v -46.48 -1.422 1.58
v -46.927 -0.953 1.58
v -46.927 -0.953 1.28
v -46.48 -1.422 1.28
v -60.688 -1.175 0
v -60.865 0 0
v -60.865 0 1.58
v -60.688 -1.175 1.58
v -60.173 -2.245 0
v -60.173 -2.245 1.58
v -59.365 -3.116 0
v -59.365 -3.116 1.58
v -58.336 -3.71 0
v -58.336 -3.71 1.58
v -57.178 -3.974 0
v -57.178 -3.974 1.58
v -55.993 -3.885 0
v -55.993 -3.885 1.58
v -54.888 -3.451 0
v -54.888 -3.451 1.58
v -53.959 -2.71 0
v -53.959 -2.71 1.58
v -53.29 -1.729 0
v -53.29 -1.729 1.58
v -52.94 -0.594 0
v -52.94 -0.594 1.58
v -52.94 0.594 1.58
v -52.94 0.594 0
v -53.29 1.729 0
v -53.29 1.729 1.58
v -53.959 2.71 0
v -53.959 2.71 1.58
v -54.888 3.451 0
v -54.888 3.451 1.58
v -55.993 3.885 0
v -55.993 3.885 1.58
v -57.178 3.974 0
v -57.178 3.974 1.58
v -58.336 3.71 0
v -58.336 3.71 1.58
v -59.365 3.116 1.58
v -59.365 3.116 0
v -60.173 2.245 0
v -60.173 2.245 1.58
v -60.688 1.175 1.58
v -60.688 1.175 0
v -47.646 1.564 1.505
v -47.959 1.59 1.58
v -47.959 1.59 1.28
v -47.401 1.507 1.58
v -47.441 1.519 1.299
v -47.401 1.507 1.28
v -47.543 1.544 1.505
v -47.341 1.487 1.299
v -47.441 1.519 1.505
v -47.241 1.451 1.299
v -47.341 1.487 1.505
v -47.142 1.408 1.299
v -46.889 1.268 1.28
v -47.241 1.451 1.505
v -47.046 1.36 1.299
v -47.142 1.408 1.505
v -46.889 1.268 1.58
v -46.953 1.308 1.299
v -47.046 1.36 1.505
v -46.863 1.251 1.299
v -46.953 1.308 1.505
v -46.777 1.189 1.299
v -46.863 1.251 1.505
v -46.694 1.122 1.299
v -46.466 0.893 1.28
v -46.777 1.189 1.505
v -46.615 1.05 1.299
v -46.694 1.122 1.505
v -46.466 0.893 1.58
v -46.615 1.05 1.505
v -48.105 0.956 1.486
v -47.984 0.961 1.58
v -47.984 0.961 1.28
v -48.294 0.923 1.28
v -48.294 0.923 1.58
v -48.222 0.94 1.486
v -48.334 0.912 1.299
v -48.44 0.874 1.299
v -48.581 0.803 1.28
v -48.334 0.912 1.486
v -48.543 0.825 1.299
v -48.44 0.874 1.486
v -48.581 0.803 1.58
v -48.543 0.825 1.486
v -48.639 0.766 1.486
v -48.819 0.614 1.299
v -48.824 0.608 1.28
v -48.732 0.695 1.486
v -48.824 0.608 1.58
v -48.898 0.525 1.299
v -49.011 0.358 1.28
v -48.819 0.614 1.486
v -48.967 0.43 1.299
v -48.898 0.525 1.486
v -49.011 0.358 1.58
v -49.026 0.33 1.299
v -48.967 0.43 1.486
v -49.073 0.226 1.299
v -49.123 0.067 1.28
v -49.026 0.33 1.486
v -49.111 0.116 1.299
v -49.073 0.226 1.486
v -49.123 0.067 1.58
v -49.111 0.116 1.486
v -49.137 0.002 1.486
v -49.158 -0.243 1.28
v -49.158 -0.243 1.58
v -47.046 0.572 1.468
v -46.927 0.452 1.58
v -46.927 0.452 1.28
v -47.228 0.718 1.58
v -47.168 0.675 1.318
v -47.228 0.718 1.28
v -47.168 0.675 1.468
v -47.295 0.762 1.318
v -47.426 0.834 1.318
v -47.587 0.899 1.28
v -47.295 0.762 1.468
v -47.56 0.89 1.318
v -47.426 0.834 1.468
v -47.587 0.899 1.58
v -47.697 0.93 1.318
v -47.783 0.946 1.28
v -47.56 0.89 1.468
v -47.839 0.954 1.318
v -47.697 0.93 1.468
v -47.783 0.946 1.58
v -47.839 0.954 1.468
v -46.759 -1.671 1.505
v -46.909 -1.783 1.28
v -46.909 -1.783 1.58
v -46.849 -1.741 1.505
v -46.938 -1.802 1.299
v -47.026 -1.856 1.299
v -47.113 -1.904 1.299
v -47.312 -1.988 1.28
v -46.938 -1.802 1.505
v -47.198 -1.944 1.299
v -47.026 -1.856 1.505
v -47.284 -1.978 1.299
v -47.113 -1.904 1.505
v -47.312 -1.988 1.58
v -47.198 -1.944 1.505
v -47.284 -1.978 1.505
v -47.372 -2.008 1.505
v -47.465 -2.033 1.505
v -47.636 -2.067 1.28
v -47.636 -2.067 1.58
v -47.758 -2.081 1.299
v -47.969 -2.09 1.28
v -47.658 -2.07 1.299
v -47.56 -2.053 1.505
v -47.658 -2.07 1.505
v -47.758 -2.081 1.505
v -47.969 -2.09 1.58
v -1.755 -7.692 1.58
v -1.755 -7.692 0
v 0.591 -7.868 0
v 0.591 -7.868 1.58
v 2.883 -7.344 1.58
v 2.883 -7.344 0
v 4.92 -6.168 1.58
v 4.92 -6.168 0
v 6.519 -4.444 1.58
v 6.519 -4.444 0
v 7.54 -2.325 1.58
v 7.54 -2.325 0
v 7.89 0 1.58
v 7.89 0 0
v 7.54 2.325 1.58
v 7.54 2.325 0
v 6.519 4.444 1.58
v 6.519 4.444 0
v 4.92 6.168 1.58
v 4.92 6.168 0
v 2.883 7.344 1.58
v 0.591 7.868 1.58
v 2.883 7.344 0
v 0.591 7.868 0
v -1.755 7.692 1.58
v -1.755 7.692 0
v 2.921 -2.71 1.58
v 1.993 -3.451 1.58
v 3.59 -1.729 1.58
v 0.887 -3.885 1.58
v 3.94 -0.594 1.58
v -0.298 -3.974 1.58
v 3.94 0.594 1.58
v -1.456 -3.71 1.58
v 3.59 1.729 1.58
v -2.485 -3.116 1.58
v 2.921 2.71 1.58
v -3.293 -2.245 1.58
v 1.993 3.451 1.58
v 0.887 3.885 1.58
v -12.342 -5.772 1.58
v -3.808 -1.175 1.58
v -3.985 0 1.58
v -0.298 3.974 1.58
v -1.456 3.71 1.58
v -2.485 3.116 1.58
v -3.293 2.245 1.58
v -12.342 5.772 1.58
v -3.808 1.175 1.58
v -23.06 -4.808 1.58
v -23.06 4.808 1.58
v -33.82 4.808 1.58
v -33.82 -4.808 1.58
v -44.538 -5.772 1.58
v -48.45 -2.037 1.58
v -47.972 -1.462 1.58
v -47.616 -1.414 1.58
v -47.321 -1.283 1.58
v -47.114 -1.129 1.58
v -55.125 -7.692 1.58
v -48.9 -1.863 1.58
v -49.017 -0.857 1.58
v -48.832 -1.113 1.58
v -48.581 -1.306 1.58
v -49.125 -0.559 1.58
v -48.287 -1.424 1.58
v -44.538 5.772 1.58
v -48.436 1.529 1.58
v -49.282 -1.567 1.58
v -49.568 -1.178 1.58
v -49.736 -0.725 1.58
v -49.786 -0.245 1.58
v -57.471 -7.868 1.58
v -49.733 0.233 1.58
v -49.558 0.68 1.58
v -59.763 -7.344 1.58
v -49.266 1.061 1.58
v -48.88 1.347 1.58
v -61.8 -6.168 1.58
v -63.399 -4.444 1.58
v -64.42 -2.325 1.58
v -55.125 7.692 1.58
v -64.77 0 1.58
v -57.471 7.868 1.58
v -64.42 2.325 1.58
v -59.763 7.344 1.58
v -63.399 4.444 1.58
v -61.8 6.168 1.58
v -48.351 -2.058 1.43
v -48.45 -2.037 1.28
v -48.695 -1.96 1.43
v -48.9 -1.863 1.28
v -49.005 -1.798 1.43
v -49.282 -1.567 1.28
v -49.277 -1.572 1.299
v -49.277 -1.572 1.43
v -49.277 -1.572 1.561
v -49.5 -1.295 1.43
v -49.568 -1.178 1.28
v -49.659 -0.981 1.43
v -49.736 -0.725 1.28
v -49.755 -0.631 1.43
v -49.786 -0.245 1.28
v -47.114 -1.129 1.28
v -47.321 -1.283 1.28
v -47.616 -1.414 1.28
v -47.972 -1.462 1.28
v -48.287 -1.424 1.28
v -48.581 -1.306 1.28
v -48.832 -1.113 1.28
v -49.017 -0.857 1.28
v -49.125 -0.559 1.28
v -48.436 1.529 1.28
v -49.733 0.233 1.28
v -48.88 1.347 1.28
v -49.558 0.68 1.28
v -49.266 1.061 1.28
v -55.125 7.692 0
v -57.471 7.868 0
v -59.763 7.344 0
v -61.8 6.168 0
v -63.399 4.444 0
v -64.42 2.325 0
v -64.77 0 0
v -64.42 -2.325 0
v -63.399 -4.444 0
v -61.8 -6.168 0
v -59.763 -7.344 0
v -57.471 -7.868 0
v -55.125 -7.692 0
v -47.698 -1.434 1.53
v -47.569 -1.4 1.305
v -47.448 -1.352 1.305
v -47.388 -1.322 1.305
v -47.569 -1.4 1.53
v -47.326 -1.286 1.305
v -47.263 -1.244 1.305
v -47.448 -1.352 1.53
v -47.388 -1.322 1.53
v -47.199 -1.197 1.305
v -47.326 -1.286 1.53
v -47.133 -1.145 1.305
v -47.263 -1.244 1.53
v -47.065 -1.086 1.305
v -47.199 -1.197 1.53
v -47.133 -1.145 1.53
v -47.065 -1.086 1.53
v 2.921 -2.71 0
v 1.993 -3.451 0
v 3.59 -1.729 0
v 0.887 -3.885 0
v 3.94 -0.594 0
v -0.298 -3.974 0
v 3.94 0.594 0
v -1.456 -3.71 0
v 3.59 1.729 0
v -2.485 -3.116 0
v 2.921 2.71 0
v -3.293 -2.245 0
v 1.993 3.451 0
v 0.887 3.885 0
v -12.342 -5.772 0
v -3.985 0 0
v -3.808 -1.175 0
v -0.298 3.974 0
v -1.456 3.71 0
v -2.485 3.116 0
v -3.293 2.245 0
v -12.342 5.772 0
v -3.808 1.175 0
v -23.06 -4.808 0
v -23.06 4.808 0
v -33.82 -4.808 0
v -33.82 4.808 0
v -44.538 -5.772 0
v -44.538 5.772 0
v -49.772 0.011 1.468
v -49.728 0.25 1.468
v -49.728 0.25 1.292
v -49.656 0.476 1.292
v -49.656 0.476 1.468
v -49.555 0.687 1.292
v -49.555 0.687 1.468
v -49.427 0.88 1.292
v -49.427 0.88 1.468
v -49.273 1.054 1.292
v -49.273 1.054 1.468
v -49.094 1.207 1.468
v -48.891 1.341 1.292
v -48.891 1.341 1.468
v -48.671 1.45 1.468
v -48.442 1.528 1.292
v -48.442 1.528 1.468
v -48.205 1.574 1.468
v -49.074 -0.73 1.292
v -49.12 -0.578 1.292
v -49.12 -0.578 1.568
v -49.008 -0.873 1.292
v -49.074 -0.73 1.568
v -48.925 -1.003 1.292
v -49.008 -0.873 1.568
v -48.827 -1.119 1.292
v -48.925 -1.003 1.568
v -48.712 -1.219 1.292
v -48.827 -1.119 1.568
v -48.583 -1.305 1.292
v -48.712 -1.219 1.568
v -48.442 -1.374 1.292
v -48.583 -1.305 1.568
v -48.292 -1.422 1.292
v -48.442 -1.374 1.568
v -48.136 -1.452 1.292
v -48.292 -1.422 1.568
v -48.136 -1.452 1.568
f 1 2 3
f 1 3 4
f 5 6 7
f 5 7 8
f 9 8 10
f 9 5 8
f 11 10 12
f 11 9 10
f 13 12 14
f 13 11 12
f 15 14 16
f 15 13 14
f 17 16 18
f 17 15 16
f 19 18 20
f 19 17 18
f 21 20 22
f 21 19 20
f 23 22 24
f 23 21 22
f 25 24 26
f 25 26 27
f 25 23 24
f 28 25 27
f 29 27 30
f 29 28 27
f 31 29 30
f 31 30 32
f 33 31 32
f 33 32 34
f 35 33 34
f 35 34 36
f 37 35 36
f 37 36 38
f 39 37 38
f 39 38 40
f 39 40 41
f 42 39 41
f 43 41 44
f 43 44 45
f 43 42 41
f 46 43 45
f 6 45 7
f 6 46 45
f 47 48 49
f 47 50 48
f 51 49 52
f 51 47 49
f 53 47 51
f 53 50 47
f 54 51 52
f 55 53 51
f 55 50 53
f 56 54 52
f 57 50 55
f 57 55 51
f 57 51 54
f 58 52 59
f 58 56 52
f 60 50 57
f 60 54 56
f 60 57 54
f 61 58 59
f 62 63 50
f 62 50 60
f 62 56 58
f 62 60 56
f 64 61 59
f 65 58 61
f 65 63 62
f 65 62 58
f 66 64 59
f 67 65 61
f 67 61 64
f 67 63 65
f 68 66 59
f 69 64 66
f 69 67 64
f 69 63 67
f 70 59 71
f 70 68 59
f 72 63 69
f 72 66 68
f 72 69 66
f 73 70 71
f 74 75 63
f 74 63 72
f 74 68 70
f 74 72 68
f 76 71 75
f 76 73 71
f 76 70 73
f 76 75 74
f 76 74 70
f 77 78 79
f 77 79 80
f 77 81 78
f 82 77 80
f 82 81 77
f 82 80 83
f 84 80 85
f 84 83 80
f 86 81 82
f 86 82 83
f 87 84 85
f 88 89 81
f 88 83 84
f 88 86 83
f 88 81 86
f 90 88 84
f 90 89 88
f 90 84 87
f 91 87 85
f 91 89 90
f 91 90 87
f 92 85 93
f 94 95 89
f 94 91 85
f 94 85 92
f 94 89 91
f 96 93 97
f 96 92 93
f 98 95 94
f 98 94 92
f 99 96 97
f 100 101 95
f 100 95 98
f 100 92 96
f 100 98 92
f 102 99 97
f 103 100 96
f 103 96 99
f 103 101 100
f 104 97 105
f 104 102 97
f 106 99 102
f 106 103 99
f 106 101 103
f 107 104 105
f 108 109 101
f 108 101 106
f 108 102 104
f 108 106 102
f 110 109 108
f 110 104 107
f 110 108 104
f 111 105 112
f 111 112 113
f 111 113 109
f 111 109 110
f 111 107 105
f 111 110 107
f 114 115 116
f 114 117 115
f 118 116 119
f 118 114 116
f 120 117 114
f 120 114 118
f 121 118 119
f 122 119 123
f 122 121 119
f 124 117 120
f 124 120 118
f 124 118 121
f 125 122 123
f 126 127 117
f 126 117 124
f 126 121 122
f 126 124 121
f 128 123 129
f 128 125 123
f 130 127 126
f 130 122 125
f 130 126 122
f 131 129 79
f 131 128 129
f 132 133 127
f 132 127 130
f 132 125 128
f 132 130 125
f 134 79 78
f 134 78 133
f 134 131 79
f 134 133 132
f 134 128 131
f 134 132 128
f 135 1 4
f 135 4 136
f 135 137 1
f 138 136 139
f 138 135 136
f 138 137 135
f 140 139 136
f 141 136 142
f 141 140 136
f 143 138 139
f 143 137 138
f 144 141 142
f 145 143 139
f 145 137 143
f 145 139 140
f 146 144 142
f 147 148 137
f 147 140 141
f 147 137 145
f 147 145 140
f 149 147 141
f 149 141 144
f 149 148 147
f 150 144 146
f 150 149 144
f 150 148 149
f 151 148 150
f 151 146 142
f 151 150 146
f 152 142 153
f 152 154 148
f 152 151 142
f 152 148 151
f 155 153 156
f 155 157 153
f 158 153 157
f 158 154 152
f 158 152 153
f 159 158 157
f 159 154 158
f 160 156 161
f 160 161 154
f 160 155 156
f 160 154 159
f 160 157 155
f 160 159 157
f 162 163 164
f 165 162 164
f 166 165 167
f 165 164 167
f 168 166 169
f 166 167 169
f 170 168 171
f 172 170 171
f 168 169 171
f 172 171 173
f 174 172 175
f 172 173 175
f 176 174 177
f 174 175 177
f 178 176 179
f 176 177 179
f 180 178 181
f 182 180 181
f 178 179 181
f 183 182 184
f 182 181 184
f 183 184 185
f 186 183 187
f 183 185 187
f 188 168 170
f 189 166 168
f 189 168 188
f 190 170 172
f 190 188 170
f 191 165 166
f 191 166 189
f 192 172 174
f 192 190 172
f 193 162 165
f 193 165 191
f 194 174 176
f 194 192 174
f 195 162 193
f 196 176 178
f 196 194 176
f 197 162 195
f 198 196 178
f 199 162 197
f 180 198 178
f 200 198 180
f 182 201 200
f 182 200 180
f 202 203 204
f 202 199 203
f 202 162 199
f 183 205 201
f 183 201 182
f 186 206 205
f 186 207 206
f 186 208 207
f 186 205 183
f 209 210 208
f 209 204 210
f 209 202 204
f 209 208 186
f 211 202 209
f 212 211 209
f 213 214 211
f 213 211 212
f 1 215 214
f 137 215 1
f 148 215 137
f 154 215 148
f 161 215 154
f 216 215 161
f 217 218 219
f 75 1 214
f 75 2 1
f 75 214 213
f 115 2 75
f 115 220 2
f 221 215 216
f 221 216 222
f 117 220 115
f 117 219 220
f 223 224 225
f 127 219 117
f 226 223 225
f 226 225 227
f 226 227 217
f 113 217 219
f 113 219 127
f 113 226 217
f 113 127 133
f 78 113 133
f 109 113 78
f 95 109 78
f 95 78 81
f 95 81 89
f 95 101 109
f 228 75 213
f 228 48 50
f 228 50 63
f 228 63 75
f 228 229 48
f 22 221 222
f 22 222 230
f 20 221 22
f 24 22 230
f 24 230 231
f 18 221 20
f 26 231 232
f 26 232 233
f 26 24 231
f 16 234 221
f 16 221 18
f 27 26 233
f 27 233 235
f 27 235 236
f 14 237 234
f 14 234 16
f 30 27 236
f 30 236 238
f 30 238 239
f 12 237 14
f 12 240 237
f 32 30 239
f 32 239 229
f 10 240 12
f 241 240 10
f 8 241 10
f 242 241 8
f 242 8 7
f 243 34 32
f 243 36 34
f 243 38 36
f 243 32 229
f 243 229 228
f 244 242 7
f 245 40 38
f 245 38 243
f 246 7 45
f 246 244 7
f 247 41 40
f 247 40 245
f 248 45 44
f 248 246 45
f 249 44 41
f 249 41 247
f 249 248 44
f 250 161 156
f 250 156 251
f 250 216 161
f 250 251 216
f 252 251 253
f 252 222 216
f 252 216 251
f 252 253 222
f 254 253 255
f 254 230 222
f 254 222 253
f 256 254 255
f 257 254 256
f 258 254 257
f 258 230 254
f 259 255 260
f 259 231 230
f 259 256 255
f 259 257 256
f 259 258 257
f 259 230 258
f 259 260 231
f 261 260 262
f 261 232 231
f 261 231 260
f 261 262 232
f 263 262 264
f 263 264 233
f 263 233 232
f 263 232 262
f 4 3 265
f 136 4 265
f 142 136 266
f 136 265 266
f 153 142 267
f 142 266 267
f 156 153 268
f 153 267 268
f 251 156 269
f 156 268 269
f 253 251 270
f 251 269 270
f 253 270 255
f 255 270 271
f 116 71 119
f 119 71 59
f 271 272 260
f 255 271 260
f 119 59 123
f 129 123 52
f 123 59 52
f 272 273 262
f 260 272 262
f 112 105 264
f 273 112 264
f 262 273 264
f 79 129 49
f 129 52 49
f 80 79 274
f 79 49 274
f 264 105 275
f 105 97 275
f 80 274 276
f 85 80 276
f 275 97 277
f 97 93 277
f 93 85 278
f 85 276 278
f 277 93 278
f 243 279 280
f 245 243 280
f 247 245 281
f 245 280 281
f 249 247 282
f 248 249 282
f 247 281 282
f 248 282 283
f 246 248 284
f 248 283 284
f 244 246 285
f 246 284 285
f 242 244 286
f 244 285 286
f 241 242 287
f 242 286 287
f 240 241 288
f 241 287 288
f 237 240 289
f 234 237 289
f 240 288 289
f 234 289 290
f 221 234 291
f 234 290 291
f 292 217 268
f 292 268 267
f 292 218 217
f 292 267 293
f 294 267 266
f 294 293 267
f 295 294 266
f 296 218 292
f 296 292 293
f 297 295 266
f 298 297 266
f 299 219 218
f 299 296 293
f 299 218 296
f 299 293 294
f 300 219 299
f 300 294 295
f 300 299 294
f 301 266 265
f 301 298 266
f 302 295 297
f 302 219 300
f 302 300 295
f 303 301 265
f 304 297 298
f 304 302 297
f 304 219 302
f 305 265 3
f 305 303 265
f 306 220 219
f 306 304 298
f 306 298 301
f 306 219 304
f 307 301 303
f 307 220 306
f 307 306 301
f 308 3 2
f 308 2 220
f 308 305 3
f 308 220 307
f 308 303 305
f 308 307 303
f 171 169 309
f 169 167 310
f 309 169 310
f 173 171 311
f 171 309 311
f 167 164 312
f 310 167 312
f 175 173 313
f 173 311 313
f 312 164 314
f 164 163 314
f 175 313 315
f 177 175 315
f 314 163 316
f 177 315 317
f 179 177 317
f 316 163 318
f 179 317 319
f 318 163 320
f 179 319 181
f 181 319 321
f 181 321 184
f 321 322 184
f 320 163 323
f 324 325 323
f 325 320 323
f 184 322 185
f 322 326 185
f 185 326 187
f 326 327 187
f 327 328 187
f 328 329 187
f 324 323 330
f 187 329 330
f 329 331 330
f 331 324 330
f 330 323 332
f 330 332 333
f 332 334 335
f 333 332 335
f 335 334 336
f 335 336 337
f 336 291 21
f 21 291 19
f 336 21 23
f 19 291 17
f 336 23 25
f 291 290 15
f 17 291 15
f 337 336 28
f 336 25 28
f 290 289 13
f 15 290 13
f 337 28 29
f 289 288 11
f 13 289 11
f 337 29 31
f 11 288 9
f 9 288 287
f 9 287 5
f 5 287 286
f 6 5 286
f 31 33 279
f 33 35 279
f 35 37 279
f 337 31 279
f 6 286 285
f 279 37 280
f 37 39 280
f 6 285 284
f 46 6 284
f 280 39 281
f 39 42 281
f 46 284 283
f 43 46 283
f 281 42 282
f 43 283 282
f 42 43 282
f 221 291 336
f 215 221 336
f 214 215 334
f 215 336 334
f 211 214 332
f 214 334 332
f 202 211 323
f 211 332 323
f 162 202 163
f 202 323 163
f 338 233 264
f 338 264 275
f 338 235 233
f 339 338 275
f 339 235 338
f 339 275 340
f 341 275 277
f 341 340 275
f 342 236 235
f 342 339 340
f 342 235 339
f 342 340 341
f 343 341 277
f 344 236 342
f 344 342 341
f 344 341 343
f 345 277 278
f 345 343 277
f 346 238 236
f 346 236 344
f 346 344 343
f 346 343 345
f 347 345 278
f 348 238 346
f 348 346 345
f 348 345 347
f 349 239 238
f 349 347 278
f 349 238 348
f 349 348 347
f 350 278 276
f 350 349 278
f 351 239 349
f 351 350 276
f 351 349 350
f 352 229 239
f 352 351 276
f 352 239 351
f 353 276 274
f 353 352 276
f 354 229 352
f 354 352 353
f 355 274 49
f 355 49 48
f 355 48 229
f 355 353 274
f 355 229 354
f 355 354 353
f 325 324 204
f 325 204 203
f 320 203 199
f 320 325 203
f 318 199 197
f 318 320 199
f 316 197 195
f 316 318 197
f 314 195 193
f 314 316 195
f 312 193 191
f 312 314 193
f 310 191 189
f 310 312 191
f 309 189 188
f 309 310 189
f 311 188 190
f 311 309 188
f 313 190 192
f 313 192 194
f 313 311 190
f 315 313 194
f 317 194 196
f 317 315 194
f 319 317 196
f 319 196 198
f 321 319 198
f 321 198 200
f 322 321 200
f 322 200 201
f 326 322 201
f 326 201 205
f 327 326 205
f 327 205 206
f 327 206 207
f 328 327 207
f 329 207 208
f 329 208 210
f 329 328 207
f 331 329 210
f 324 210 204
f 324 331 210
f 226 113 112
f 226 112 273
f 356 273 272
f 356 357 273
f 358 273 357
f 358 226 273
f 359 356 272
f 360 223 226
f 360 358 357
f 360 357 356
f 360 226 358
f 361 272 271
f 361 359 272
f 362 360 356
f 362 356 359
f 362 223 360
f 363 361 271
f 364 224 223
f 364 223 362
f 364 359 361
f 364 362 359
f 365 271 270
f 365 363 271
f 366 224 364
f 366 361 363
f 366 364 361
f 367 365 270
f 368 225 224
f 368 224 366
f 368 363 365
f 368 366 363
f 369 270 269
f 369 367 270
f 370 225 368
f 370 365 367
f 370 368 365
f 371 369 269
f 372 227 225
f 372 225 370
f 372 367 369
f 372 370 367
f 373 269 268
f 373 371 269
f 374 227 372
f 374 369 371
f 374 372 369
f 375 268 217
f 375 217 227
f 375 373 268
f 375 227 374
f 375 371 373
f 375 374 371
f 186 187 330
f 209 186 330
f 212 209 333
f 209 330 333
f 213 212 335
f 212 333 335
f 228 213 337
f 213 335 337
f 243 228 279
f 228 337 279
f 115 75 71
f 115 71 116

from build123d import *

# Parameters (mm, degrees)
ESQUISSE1_R             = 3.985
BOSS_EXTRU_1_DEPTH      = 1.58
ENL_V_MAT_EXTRU_1_DEPTH = 0.3


with BuildPart() as part:
    # Esquisse1 → Boss.-Extru.1 (new body)
    with BuildSketch(Plane(origin=(0, 0, 0), x_dir=(0, 1, 0), z_dir=(0, 0, 1))):
        with BuildLine():
            ThreePointArc((-7.69243745, 1.754567206), (0, -7.89), (7.69243745, 1.754567206))
            ThreePointArc((7.69243745, 1.754567206), (4.687683834, 28.44), (7.69243745, 55.125432794))
            ThreePointArc((7.69243745, 55.125432794), (0, 64.77), (-7.69243745, 55.125432794))
            ThreePointArc((-7.69243745, 55.125432794), (-4.687683834, 28.44), (-7.69243745, 1.754567206))
        make_face()
        with Locations(Location((0, 0, 0), (0, 0, 90))):
            Circle(ESQUISSE1_R, mode=Mode.SUBTRACT)
        with Locations(Location((0, 56.88, 0), (0, 0, 90))):
            Circle(ESQUISSE1_R, mode=Mode.SUBTRACT)
    extrude(amount=BOSS_EXTRU_1_DEPTH)

    # Esquisse2 → Enlèv. mat.-Extru.1 (cut)
    with BuildSketch(Plane.XY.offset(1.58)):
        with BuildLine():
            Line((-46.465889749, 0.892630637), (-46.926526768, 0.45232615))
            add(Edge.make_bspline(
                [(-46.926526768, 0.45232615), (-46.965601753, 0.49272975), (-47.04192744, 0.571650638), (-47.164916845, 0.676134939), (-47.292821348, 0.763208466), (-47.423152822, 0.836541237), (-47.558255553, 0.892022704), (-47.696567385, 0.932452984), (-47.838971481, 0.957101797), (-47.935345095, 0.959922058), (-47.983818435, 0.961340573)],
                knots=[0, 0, 0, 0, 1.115251505, 2.178435587, 3.19620269, 4.182487026, 5.141301733, 6.088180966, 7.038406374, 8, 8, 8, 8], degree=3))
            add(Edge.make_bspline(
                [(-47.983818435, 0.961340573), (-48.024299564, 0.960219896), (-48.104184612, 0.958008364), (-48.221476797, 0.941795654), (-48.333672834, 0.914225235), (-48.441156787, 0.87622809), (-48.543612381, 0.827061802), (-48.641254426, 0.766764423), (-48.73384219, 0.695880524), (-48.820152642, 0.614776863), (-48.89910641, 0.526165019), (-48.968867091, 0.431616392), (-49.027302852, 0.331347589), (-49.075260131, 0.226374058), (-49.112616997, 0.11620993), (-49.139294493, 0.000929371), (-49.154724043, -0.119604909), (-49.157027007, -0.201543214), (-49.158197441, -0.243186671)],
                knots=[0, 0, 0, 0, 1.035432265, 2.043311493, 3.022114605, 3.98653278, 4.95457646, 5.923598177, 6.917315552, 7.932509744, 8.948865224, 9.949768934, 10.933144597, 11.912367597, 12.897413939, 13.903909035, 14.934704909, 16, 16, 16, 16], degree=3))
            add(Edge.make_bspline(
                [(-49.158197441, -0.243186671), (-49.157860135, -0.272414963), (-49.157195299, -0.330024526), (-49.149917488, -0.41524506), (-49.138198495, -0.497929125), (-49.12123821, -0.577951477), (-49.100029206, -0.655381463), (-49.075146216, -0.730887069), (-49.04393087, -0.803424977), (-49.009281366, -0.873837667), (-48.968984392, -0.940203842), (-48.925536819, -1.003489497), (-48.878425021, -1.063384413), (-48.82734385, -1.119643738), (-48.771574403, -1.171388264), (-48.712558114, -1.220174011), (-48.64929946, -1.264779706), (-48.583112483, -1.306324779), (-48.513425411, -1.342415337), (-48.442129016, -1.37510641), (-48.368142301, -1.401656422), (-48.292366099, -1.423058153), (-48.215071208, -1.44125713), (-48.13550161, -1.452462799), (-48.054347076, -1.460948721), (-47.999500233, -1.461472677), (-47.971899364, -1.46173635)],
                knots=[0, 0, 0, 0, 1.103660481, 2.175337485, 3.227646561, 4.255952547, 5.262355991, 6.258840057, 7.255597736, 8.242457506, 9.22035537, 10.185017736, 11.140346927, 12.096287581, 13.051739095, 14.01125915, 14.986044842, 15.97314143, 16.960198552, 17.947847494, 18.933482797, 19.925264591, 20.920966487, 21.929612487, 22.958107872, 24, 24, 24, 24], degree=3))
            add(Edge.make_bspline(
                [(-47.971899364, -1.46173635), (-47.925083547, -1.460382188), (-47.833102641, -1.457721612), (-47.698107435, -1.436916285), (-47.569470453, -1.4026927), (-47.46669012, -1.362276634), (-47.386164443, -1.322365244), (-47.324861437, -1.285449174), (-47.261469349, -1.244154496), (-47.197041071, -1.196922705), (-47.130851909, -1.144320601), (-47.064070258, -1.0851961), (-46.994986493, -1.021496087), (-46.949730403, -0.976032136), (-46.926526768, -0.952721927)],
                knots=[0, 0, 0, 0, 1.404581149, 2.759636711, 4.088442092, 5.392261763, 6.066678138, 6.783632037, 7.538459478, 8.336747902, 9.180226004, 10.074962426, 11.012997595, 12, 12, 12, 12], degree=3))
            Line((-46.926526768, -0.952721927), (-46.479912185, -1.421772408))
            add(Edge.make_bspline(
                [(-46.479912185, -1.421772408), (-46.511306786, -1.45208291), (-46.572582334, -1.511242527), (-46.665014796, -1.595243664), (-46.757330929, -1.670728023), (-46.847300567, -1.740435357), (-46.936397505, -1.80233492), (-47.024612296, -1.856488534), (-47.11094631, -1.90426582), (-47.197192299, -1.94486104), (-47.283886932, -1.979330597), (-47.373085521, -2.009006624), (-47.465060755, -2.034111475), (-47.560374377, -2.054367792), (-47.658137358, -2.070610624), (-47.759264632, -2.081574442), (-47.863115, -2.088945052), (-47.933558314, -2.089607362), (-47.969094877, -2.089941478)],
                knots=[0, 0, 0, 0, 1.244526981, 2.429050516, 3.560637417, 4.644440555, 5.67424972, 6.652764056, 7.595344123, 8.486817594, 9.369275933, 10.254498637, 11.166417451, 12.086725134, 13.032340136, 13.991389299, 14.986715468, 16, 16, 16, 16], degree=3))
            add(Edge.make_bspline(
                [(-47.969094877, -2.089941478), (-48.034371141, -2.088277456), (-48.162098645, -2.085021427), (-48.349279971, -2.060896459), (-48.527097207, -2.020451373), (-48.695982948, -1.963250867), (-48.855883492, -1.890179901), (-49.006757933, -1.800598328), (-49.148363093, -1.694744151), (-49.279555082, -1.573858086), (-49.39822448, -1.440349574), (-49.503114485, -1.29699806), (-49.589879501, -1.143099023), (-49.661922363, -0.980926042), (-49.718258934, -0.809739061), (-49.75791033, -0.629352906), (-49.782363056, -0.439941752), (-49.785038219, -0.310569568), (-49.786402569, -0.244588914)],
                knots=[0, 0, 0, 0, 1.078019885, 2.10938526, 3.111377082, 4.085535484, 5.04941344, 6.010039228, 6.978205633, 7.964457913, 8.951525778, 9.924444315, 10.892603023, 11.863865945, 12.85144698, 13.863884204, 14.910567087, 16, 16, 16, 16], degree=3))
            add(Edge.make_bspline(
                [(-49.786402569, -0.244588914), (-49.785826061, -0.201556895), (-49.784683562, -0.11627795), (-49.772675795, 0.009344844), (-49.755936269, 0.131804598), (-49.729380533, 0.249829774), (-49.697370213, 0.365010388), (-49.657561174, 0.476094562), (-49.610016997, 0.583401563), (-49.556270142, 0.687111029), (-49.495466864, 0.786543551), (-49.427542926, 0.880844849), (-49.354246958, 0.97074291), (-49.273817774, 1.05504507), (-49.187424118, 1.134491518), (-49.094675932, 1.20865172), (-48.99613105, 1.278589214), (-48.891522746, 1.342500485), (-48.782883283, 1.400311626), (-48.671582889, 1.451303521), (-48.557895017, 1.493921003), (-48.442300349, 1.529270632), (-48.324310499, 1.555656631), (-48.204767649, 1.57562998), (-48.082654633, 1.586795211), (-48.000666322, 1.58862303), (-47.959279172, 1.589545701)],
                knots=[0, 0, 0, 0, 1.071919942, 2.124283339, 3.142214191, 4.149696895, 5.136002878, 6.119640489, 7.086990633, 8.058538607, 9.028339693, 9.988281803, 10.952401235, 11.916291999, 12.888973767, 13.874849856, 14.873389453, 15.898127285, 16.927174885, 17.938320013, 18.946391617, 19.950418109, 20.947802303, 21.956882652, 22.968648068, 24, 24, 24, 24], degree=3))
            add(Edge.make_bspline(
                [(-47.959279172, 1.589545701), (-47.92397169, 1.589016803), (-47.853723825, 1.587964506), (-47.749112966, 1.579192466), (-47.645338735, 1.565416065), (-47.542772677, 1.54463041), (-47.440681134, 1.51995521), (-47.340405703, 1.487646441), (-47.240364486, 1.451632228), (-47.142126479, 1.408584591), (-47.045554557, 1.361594206), (-46.95291107, 1.308281908), (-46.862640542, 1.251928476), (-46.776743314, 1.189198667), (-46.693610345, 1.122367809), (-46.613676346, 1.051124096), (-46.537642783, 0.974279688), (-46.489928341, 0.919984577), (-46.465889749, 0.892630637)],
                knots=[0, 0, 0, 0, 0.996412454, 1.982464992, 2.961075852, 3.949442424, 4.934965278, 5.923860011, 6.921385422, 7.934793307, 8.949617135, 9.951082467, 10.950285876, 11.951772932, 12.951063433, 13.960125323, 14.972308753, 16, 16, 16, 16], degree=3))
        make_face()
    extrude(amount=-ENL_V_MAT_EXTRU_1_DEPTH, mode=Mode.SUBTRACT)


solid = part.part
